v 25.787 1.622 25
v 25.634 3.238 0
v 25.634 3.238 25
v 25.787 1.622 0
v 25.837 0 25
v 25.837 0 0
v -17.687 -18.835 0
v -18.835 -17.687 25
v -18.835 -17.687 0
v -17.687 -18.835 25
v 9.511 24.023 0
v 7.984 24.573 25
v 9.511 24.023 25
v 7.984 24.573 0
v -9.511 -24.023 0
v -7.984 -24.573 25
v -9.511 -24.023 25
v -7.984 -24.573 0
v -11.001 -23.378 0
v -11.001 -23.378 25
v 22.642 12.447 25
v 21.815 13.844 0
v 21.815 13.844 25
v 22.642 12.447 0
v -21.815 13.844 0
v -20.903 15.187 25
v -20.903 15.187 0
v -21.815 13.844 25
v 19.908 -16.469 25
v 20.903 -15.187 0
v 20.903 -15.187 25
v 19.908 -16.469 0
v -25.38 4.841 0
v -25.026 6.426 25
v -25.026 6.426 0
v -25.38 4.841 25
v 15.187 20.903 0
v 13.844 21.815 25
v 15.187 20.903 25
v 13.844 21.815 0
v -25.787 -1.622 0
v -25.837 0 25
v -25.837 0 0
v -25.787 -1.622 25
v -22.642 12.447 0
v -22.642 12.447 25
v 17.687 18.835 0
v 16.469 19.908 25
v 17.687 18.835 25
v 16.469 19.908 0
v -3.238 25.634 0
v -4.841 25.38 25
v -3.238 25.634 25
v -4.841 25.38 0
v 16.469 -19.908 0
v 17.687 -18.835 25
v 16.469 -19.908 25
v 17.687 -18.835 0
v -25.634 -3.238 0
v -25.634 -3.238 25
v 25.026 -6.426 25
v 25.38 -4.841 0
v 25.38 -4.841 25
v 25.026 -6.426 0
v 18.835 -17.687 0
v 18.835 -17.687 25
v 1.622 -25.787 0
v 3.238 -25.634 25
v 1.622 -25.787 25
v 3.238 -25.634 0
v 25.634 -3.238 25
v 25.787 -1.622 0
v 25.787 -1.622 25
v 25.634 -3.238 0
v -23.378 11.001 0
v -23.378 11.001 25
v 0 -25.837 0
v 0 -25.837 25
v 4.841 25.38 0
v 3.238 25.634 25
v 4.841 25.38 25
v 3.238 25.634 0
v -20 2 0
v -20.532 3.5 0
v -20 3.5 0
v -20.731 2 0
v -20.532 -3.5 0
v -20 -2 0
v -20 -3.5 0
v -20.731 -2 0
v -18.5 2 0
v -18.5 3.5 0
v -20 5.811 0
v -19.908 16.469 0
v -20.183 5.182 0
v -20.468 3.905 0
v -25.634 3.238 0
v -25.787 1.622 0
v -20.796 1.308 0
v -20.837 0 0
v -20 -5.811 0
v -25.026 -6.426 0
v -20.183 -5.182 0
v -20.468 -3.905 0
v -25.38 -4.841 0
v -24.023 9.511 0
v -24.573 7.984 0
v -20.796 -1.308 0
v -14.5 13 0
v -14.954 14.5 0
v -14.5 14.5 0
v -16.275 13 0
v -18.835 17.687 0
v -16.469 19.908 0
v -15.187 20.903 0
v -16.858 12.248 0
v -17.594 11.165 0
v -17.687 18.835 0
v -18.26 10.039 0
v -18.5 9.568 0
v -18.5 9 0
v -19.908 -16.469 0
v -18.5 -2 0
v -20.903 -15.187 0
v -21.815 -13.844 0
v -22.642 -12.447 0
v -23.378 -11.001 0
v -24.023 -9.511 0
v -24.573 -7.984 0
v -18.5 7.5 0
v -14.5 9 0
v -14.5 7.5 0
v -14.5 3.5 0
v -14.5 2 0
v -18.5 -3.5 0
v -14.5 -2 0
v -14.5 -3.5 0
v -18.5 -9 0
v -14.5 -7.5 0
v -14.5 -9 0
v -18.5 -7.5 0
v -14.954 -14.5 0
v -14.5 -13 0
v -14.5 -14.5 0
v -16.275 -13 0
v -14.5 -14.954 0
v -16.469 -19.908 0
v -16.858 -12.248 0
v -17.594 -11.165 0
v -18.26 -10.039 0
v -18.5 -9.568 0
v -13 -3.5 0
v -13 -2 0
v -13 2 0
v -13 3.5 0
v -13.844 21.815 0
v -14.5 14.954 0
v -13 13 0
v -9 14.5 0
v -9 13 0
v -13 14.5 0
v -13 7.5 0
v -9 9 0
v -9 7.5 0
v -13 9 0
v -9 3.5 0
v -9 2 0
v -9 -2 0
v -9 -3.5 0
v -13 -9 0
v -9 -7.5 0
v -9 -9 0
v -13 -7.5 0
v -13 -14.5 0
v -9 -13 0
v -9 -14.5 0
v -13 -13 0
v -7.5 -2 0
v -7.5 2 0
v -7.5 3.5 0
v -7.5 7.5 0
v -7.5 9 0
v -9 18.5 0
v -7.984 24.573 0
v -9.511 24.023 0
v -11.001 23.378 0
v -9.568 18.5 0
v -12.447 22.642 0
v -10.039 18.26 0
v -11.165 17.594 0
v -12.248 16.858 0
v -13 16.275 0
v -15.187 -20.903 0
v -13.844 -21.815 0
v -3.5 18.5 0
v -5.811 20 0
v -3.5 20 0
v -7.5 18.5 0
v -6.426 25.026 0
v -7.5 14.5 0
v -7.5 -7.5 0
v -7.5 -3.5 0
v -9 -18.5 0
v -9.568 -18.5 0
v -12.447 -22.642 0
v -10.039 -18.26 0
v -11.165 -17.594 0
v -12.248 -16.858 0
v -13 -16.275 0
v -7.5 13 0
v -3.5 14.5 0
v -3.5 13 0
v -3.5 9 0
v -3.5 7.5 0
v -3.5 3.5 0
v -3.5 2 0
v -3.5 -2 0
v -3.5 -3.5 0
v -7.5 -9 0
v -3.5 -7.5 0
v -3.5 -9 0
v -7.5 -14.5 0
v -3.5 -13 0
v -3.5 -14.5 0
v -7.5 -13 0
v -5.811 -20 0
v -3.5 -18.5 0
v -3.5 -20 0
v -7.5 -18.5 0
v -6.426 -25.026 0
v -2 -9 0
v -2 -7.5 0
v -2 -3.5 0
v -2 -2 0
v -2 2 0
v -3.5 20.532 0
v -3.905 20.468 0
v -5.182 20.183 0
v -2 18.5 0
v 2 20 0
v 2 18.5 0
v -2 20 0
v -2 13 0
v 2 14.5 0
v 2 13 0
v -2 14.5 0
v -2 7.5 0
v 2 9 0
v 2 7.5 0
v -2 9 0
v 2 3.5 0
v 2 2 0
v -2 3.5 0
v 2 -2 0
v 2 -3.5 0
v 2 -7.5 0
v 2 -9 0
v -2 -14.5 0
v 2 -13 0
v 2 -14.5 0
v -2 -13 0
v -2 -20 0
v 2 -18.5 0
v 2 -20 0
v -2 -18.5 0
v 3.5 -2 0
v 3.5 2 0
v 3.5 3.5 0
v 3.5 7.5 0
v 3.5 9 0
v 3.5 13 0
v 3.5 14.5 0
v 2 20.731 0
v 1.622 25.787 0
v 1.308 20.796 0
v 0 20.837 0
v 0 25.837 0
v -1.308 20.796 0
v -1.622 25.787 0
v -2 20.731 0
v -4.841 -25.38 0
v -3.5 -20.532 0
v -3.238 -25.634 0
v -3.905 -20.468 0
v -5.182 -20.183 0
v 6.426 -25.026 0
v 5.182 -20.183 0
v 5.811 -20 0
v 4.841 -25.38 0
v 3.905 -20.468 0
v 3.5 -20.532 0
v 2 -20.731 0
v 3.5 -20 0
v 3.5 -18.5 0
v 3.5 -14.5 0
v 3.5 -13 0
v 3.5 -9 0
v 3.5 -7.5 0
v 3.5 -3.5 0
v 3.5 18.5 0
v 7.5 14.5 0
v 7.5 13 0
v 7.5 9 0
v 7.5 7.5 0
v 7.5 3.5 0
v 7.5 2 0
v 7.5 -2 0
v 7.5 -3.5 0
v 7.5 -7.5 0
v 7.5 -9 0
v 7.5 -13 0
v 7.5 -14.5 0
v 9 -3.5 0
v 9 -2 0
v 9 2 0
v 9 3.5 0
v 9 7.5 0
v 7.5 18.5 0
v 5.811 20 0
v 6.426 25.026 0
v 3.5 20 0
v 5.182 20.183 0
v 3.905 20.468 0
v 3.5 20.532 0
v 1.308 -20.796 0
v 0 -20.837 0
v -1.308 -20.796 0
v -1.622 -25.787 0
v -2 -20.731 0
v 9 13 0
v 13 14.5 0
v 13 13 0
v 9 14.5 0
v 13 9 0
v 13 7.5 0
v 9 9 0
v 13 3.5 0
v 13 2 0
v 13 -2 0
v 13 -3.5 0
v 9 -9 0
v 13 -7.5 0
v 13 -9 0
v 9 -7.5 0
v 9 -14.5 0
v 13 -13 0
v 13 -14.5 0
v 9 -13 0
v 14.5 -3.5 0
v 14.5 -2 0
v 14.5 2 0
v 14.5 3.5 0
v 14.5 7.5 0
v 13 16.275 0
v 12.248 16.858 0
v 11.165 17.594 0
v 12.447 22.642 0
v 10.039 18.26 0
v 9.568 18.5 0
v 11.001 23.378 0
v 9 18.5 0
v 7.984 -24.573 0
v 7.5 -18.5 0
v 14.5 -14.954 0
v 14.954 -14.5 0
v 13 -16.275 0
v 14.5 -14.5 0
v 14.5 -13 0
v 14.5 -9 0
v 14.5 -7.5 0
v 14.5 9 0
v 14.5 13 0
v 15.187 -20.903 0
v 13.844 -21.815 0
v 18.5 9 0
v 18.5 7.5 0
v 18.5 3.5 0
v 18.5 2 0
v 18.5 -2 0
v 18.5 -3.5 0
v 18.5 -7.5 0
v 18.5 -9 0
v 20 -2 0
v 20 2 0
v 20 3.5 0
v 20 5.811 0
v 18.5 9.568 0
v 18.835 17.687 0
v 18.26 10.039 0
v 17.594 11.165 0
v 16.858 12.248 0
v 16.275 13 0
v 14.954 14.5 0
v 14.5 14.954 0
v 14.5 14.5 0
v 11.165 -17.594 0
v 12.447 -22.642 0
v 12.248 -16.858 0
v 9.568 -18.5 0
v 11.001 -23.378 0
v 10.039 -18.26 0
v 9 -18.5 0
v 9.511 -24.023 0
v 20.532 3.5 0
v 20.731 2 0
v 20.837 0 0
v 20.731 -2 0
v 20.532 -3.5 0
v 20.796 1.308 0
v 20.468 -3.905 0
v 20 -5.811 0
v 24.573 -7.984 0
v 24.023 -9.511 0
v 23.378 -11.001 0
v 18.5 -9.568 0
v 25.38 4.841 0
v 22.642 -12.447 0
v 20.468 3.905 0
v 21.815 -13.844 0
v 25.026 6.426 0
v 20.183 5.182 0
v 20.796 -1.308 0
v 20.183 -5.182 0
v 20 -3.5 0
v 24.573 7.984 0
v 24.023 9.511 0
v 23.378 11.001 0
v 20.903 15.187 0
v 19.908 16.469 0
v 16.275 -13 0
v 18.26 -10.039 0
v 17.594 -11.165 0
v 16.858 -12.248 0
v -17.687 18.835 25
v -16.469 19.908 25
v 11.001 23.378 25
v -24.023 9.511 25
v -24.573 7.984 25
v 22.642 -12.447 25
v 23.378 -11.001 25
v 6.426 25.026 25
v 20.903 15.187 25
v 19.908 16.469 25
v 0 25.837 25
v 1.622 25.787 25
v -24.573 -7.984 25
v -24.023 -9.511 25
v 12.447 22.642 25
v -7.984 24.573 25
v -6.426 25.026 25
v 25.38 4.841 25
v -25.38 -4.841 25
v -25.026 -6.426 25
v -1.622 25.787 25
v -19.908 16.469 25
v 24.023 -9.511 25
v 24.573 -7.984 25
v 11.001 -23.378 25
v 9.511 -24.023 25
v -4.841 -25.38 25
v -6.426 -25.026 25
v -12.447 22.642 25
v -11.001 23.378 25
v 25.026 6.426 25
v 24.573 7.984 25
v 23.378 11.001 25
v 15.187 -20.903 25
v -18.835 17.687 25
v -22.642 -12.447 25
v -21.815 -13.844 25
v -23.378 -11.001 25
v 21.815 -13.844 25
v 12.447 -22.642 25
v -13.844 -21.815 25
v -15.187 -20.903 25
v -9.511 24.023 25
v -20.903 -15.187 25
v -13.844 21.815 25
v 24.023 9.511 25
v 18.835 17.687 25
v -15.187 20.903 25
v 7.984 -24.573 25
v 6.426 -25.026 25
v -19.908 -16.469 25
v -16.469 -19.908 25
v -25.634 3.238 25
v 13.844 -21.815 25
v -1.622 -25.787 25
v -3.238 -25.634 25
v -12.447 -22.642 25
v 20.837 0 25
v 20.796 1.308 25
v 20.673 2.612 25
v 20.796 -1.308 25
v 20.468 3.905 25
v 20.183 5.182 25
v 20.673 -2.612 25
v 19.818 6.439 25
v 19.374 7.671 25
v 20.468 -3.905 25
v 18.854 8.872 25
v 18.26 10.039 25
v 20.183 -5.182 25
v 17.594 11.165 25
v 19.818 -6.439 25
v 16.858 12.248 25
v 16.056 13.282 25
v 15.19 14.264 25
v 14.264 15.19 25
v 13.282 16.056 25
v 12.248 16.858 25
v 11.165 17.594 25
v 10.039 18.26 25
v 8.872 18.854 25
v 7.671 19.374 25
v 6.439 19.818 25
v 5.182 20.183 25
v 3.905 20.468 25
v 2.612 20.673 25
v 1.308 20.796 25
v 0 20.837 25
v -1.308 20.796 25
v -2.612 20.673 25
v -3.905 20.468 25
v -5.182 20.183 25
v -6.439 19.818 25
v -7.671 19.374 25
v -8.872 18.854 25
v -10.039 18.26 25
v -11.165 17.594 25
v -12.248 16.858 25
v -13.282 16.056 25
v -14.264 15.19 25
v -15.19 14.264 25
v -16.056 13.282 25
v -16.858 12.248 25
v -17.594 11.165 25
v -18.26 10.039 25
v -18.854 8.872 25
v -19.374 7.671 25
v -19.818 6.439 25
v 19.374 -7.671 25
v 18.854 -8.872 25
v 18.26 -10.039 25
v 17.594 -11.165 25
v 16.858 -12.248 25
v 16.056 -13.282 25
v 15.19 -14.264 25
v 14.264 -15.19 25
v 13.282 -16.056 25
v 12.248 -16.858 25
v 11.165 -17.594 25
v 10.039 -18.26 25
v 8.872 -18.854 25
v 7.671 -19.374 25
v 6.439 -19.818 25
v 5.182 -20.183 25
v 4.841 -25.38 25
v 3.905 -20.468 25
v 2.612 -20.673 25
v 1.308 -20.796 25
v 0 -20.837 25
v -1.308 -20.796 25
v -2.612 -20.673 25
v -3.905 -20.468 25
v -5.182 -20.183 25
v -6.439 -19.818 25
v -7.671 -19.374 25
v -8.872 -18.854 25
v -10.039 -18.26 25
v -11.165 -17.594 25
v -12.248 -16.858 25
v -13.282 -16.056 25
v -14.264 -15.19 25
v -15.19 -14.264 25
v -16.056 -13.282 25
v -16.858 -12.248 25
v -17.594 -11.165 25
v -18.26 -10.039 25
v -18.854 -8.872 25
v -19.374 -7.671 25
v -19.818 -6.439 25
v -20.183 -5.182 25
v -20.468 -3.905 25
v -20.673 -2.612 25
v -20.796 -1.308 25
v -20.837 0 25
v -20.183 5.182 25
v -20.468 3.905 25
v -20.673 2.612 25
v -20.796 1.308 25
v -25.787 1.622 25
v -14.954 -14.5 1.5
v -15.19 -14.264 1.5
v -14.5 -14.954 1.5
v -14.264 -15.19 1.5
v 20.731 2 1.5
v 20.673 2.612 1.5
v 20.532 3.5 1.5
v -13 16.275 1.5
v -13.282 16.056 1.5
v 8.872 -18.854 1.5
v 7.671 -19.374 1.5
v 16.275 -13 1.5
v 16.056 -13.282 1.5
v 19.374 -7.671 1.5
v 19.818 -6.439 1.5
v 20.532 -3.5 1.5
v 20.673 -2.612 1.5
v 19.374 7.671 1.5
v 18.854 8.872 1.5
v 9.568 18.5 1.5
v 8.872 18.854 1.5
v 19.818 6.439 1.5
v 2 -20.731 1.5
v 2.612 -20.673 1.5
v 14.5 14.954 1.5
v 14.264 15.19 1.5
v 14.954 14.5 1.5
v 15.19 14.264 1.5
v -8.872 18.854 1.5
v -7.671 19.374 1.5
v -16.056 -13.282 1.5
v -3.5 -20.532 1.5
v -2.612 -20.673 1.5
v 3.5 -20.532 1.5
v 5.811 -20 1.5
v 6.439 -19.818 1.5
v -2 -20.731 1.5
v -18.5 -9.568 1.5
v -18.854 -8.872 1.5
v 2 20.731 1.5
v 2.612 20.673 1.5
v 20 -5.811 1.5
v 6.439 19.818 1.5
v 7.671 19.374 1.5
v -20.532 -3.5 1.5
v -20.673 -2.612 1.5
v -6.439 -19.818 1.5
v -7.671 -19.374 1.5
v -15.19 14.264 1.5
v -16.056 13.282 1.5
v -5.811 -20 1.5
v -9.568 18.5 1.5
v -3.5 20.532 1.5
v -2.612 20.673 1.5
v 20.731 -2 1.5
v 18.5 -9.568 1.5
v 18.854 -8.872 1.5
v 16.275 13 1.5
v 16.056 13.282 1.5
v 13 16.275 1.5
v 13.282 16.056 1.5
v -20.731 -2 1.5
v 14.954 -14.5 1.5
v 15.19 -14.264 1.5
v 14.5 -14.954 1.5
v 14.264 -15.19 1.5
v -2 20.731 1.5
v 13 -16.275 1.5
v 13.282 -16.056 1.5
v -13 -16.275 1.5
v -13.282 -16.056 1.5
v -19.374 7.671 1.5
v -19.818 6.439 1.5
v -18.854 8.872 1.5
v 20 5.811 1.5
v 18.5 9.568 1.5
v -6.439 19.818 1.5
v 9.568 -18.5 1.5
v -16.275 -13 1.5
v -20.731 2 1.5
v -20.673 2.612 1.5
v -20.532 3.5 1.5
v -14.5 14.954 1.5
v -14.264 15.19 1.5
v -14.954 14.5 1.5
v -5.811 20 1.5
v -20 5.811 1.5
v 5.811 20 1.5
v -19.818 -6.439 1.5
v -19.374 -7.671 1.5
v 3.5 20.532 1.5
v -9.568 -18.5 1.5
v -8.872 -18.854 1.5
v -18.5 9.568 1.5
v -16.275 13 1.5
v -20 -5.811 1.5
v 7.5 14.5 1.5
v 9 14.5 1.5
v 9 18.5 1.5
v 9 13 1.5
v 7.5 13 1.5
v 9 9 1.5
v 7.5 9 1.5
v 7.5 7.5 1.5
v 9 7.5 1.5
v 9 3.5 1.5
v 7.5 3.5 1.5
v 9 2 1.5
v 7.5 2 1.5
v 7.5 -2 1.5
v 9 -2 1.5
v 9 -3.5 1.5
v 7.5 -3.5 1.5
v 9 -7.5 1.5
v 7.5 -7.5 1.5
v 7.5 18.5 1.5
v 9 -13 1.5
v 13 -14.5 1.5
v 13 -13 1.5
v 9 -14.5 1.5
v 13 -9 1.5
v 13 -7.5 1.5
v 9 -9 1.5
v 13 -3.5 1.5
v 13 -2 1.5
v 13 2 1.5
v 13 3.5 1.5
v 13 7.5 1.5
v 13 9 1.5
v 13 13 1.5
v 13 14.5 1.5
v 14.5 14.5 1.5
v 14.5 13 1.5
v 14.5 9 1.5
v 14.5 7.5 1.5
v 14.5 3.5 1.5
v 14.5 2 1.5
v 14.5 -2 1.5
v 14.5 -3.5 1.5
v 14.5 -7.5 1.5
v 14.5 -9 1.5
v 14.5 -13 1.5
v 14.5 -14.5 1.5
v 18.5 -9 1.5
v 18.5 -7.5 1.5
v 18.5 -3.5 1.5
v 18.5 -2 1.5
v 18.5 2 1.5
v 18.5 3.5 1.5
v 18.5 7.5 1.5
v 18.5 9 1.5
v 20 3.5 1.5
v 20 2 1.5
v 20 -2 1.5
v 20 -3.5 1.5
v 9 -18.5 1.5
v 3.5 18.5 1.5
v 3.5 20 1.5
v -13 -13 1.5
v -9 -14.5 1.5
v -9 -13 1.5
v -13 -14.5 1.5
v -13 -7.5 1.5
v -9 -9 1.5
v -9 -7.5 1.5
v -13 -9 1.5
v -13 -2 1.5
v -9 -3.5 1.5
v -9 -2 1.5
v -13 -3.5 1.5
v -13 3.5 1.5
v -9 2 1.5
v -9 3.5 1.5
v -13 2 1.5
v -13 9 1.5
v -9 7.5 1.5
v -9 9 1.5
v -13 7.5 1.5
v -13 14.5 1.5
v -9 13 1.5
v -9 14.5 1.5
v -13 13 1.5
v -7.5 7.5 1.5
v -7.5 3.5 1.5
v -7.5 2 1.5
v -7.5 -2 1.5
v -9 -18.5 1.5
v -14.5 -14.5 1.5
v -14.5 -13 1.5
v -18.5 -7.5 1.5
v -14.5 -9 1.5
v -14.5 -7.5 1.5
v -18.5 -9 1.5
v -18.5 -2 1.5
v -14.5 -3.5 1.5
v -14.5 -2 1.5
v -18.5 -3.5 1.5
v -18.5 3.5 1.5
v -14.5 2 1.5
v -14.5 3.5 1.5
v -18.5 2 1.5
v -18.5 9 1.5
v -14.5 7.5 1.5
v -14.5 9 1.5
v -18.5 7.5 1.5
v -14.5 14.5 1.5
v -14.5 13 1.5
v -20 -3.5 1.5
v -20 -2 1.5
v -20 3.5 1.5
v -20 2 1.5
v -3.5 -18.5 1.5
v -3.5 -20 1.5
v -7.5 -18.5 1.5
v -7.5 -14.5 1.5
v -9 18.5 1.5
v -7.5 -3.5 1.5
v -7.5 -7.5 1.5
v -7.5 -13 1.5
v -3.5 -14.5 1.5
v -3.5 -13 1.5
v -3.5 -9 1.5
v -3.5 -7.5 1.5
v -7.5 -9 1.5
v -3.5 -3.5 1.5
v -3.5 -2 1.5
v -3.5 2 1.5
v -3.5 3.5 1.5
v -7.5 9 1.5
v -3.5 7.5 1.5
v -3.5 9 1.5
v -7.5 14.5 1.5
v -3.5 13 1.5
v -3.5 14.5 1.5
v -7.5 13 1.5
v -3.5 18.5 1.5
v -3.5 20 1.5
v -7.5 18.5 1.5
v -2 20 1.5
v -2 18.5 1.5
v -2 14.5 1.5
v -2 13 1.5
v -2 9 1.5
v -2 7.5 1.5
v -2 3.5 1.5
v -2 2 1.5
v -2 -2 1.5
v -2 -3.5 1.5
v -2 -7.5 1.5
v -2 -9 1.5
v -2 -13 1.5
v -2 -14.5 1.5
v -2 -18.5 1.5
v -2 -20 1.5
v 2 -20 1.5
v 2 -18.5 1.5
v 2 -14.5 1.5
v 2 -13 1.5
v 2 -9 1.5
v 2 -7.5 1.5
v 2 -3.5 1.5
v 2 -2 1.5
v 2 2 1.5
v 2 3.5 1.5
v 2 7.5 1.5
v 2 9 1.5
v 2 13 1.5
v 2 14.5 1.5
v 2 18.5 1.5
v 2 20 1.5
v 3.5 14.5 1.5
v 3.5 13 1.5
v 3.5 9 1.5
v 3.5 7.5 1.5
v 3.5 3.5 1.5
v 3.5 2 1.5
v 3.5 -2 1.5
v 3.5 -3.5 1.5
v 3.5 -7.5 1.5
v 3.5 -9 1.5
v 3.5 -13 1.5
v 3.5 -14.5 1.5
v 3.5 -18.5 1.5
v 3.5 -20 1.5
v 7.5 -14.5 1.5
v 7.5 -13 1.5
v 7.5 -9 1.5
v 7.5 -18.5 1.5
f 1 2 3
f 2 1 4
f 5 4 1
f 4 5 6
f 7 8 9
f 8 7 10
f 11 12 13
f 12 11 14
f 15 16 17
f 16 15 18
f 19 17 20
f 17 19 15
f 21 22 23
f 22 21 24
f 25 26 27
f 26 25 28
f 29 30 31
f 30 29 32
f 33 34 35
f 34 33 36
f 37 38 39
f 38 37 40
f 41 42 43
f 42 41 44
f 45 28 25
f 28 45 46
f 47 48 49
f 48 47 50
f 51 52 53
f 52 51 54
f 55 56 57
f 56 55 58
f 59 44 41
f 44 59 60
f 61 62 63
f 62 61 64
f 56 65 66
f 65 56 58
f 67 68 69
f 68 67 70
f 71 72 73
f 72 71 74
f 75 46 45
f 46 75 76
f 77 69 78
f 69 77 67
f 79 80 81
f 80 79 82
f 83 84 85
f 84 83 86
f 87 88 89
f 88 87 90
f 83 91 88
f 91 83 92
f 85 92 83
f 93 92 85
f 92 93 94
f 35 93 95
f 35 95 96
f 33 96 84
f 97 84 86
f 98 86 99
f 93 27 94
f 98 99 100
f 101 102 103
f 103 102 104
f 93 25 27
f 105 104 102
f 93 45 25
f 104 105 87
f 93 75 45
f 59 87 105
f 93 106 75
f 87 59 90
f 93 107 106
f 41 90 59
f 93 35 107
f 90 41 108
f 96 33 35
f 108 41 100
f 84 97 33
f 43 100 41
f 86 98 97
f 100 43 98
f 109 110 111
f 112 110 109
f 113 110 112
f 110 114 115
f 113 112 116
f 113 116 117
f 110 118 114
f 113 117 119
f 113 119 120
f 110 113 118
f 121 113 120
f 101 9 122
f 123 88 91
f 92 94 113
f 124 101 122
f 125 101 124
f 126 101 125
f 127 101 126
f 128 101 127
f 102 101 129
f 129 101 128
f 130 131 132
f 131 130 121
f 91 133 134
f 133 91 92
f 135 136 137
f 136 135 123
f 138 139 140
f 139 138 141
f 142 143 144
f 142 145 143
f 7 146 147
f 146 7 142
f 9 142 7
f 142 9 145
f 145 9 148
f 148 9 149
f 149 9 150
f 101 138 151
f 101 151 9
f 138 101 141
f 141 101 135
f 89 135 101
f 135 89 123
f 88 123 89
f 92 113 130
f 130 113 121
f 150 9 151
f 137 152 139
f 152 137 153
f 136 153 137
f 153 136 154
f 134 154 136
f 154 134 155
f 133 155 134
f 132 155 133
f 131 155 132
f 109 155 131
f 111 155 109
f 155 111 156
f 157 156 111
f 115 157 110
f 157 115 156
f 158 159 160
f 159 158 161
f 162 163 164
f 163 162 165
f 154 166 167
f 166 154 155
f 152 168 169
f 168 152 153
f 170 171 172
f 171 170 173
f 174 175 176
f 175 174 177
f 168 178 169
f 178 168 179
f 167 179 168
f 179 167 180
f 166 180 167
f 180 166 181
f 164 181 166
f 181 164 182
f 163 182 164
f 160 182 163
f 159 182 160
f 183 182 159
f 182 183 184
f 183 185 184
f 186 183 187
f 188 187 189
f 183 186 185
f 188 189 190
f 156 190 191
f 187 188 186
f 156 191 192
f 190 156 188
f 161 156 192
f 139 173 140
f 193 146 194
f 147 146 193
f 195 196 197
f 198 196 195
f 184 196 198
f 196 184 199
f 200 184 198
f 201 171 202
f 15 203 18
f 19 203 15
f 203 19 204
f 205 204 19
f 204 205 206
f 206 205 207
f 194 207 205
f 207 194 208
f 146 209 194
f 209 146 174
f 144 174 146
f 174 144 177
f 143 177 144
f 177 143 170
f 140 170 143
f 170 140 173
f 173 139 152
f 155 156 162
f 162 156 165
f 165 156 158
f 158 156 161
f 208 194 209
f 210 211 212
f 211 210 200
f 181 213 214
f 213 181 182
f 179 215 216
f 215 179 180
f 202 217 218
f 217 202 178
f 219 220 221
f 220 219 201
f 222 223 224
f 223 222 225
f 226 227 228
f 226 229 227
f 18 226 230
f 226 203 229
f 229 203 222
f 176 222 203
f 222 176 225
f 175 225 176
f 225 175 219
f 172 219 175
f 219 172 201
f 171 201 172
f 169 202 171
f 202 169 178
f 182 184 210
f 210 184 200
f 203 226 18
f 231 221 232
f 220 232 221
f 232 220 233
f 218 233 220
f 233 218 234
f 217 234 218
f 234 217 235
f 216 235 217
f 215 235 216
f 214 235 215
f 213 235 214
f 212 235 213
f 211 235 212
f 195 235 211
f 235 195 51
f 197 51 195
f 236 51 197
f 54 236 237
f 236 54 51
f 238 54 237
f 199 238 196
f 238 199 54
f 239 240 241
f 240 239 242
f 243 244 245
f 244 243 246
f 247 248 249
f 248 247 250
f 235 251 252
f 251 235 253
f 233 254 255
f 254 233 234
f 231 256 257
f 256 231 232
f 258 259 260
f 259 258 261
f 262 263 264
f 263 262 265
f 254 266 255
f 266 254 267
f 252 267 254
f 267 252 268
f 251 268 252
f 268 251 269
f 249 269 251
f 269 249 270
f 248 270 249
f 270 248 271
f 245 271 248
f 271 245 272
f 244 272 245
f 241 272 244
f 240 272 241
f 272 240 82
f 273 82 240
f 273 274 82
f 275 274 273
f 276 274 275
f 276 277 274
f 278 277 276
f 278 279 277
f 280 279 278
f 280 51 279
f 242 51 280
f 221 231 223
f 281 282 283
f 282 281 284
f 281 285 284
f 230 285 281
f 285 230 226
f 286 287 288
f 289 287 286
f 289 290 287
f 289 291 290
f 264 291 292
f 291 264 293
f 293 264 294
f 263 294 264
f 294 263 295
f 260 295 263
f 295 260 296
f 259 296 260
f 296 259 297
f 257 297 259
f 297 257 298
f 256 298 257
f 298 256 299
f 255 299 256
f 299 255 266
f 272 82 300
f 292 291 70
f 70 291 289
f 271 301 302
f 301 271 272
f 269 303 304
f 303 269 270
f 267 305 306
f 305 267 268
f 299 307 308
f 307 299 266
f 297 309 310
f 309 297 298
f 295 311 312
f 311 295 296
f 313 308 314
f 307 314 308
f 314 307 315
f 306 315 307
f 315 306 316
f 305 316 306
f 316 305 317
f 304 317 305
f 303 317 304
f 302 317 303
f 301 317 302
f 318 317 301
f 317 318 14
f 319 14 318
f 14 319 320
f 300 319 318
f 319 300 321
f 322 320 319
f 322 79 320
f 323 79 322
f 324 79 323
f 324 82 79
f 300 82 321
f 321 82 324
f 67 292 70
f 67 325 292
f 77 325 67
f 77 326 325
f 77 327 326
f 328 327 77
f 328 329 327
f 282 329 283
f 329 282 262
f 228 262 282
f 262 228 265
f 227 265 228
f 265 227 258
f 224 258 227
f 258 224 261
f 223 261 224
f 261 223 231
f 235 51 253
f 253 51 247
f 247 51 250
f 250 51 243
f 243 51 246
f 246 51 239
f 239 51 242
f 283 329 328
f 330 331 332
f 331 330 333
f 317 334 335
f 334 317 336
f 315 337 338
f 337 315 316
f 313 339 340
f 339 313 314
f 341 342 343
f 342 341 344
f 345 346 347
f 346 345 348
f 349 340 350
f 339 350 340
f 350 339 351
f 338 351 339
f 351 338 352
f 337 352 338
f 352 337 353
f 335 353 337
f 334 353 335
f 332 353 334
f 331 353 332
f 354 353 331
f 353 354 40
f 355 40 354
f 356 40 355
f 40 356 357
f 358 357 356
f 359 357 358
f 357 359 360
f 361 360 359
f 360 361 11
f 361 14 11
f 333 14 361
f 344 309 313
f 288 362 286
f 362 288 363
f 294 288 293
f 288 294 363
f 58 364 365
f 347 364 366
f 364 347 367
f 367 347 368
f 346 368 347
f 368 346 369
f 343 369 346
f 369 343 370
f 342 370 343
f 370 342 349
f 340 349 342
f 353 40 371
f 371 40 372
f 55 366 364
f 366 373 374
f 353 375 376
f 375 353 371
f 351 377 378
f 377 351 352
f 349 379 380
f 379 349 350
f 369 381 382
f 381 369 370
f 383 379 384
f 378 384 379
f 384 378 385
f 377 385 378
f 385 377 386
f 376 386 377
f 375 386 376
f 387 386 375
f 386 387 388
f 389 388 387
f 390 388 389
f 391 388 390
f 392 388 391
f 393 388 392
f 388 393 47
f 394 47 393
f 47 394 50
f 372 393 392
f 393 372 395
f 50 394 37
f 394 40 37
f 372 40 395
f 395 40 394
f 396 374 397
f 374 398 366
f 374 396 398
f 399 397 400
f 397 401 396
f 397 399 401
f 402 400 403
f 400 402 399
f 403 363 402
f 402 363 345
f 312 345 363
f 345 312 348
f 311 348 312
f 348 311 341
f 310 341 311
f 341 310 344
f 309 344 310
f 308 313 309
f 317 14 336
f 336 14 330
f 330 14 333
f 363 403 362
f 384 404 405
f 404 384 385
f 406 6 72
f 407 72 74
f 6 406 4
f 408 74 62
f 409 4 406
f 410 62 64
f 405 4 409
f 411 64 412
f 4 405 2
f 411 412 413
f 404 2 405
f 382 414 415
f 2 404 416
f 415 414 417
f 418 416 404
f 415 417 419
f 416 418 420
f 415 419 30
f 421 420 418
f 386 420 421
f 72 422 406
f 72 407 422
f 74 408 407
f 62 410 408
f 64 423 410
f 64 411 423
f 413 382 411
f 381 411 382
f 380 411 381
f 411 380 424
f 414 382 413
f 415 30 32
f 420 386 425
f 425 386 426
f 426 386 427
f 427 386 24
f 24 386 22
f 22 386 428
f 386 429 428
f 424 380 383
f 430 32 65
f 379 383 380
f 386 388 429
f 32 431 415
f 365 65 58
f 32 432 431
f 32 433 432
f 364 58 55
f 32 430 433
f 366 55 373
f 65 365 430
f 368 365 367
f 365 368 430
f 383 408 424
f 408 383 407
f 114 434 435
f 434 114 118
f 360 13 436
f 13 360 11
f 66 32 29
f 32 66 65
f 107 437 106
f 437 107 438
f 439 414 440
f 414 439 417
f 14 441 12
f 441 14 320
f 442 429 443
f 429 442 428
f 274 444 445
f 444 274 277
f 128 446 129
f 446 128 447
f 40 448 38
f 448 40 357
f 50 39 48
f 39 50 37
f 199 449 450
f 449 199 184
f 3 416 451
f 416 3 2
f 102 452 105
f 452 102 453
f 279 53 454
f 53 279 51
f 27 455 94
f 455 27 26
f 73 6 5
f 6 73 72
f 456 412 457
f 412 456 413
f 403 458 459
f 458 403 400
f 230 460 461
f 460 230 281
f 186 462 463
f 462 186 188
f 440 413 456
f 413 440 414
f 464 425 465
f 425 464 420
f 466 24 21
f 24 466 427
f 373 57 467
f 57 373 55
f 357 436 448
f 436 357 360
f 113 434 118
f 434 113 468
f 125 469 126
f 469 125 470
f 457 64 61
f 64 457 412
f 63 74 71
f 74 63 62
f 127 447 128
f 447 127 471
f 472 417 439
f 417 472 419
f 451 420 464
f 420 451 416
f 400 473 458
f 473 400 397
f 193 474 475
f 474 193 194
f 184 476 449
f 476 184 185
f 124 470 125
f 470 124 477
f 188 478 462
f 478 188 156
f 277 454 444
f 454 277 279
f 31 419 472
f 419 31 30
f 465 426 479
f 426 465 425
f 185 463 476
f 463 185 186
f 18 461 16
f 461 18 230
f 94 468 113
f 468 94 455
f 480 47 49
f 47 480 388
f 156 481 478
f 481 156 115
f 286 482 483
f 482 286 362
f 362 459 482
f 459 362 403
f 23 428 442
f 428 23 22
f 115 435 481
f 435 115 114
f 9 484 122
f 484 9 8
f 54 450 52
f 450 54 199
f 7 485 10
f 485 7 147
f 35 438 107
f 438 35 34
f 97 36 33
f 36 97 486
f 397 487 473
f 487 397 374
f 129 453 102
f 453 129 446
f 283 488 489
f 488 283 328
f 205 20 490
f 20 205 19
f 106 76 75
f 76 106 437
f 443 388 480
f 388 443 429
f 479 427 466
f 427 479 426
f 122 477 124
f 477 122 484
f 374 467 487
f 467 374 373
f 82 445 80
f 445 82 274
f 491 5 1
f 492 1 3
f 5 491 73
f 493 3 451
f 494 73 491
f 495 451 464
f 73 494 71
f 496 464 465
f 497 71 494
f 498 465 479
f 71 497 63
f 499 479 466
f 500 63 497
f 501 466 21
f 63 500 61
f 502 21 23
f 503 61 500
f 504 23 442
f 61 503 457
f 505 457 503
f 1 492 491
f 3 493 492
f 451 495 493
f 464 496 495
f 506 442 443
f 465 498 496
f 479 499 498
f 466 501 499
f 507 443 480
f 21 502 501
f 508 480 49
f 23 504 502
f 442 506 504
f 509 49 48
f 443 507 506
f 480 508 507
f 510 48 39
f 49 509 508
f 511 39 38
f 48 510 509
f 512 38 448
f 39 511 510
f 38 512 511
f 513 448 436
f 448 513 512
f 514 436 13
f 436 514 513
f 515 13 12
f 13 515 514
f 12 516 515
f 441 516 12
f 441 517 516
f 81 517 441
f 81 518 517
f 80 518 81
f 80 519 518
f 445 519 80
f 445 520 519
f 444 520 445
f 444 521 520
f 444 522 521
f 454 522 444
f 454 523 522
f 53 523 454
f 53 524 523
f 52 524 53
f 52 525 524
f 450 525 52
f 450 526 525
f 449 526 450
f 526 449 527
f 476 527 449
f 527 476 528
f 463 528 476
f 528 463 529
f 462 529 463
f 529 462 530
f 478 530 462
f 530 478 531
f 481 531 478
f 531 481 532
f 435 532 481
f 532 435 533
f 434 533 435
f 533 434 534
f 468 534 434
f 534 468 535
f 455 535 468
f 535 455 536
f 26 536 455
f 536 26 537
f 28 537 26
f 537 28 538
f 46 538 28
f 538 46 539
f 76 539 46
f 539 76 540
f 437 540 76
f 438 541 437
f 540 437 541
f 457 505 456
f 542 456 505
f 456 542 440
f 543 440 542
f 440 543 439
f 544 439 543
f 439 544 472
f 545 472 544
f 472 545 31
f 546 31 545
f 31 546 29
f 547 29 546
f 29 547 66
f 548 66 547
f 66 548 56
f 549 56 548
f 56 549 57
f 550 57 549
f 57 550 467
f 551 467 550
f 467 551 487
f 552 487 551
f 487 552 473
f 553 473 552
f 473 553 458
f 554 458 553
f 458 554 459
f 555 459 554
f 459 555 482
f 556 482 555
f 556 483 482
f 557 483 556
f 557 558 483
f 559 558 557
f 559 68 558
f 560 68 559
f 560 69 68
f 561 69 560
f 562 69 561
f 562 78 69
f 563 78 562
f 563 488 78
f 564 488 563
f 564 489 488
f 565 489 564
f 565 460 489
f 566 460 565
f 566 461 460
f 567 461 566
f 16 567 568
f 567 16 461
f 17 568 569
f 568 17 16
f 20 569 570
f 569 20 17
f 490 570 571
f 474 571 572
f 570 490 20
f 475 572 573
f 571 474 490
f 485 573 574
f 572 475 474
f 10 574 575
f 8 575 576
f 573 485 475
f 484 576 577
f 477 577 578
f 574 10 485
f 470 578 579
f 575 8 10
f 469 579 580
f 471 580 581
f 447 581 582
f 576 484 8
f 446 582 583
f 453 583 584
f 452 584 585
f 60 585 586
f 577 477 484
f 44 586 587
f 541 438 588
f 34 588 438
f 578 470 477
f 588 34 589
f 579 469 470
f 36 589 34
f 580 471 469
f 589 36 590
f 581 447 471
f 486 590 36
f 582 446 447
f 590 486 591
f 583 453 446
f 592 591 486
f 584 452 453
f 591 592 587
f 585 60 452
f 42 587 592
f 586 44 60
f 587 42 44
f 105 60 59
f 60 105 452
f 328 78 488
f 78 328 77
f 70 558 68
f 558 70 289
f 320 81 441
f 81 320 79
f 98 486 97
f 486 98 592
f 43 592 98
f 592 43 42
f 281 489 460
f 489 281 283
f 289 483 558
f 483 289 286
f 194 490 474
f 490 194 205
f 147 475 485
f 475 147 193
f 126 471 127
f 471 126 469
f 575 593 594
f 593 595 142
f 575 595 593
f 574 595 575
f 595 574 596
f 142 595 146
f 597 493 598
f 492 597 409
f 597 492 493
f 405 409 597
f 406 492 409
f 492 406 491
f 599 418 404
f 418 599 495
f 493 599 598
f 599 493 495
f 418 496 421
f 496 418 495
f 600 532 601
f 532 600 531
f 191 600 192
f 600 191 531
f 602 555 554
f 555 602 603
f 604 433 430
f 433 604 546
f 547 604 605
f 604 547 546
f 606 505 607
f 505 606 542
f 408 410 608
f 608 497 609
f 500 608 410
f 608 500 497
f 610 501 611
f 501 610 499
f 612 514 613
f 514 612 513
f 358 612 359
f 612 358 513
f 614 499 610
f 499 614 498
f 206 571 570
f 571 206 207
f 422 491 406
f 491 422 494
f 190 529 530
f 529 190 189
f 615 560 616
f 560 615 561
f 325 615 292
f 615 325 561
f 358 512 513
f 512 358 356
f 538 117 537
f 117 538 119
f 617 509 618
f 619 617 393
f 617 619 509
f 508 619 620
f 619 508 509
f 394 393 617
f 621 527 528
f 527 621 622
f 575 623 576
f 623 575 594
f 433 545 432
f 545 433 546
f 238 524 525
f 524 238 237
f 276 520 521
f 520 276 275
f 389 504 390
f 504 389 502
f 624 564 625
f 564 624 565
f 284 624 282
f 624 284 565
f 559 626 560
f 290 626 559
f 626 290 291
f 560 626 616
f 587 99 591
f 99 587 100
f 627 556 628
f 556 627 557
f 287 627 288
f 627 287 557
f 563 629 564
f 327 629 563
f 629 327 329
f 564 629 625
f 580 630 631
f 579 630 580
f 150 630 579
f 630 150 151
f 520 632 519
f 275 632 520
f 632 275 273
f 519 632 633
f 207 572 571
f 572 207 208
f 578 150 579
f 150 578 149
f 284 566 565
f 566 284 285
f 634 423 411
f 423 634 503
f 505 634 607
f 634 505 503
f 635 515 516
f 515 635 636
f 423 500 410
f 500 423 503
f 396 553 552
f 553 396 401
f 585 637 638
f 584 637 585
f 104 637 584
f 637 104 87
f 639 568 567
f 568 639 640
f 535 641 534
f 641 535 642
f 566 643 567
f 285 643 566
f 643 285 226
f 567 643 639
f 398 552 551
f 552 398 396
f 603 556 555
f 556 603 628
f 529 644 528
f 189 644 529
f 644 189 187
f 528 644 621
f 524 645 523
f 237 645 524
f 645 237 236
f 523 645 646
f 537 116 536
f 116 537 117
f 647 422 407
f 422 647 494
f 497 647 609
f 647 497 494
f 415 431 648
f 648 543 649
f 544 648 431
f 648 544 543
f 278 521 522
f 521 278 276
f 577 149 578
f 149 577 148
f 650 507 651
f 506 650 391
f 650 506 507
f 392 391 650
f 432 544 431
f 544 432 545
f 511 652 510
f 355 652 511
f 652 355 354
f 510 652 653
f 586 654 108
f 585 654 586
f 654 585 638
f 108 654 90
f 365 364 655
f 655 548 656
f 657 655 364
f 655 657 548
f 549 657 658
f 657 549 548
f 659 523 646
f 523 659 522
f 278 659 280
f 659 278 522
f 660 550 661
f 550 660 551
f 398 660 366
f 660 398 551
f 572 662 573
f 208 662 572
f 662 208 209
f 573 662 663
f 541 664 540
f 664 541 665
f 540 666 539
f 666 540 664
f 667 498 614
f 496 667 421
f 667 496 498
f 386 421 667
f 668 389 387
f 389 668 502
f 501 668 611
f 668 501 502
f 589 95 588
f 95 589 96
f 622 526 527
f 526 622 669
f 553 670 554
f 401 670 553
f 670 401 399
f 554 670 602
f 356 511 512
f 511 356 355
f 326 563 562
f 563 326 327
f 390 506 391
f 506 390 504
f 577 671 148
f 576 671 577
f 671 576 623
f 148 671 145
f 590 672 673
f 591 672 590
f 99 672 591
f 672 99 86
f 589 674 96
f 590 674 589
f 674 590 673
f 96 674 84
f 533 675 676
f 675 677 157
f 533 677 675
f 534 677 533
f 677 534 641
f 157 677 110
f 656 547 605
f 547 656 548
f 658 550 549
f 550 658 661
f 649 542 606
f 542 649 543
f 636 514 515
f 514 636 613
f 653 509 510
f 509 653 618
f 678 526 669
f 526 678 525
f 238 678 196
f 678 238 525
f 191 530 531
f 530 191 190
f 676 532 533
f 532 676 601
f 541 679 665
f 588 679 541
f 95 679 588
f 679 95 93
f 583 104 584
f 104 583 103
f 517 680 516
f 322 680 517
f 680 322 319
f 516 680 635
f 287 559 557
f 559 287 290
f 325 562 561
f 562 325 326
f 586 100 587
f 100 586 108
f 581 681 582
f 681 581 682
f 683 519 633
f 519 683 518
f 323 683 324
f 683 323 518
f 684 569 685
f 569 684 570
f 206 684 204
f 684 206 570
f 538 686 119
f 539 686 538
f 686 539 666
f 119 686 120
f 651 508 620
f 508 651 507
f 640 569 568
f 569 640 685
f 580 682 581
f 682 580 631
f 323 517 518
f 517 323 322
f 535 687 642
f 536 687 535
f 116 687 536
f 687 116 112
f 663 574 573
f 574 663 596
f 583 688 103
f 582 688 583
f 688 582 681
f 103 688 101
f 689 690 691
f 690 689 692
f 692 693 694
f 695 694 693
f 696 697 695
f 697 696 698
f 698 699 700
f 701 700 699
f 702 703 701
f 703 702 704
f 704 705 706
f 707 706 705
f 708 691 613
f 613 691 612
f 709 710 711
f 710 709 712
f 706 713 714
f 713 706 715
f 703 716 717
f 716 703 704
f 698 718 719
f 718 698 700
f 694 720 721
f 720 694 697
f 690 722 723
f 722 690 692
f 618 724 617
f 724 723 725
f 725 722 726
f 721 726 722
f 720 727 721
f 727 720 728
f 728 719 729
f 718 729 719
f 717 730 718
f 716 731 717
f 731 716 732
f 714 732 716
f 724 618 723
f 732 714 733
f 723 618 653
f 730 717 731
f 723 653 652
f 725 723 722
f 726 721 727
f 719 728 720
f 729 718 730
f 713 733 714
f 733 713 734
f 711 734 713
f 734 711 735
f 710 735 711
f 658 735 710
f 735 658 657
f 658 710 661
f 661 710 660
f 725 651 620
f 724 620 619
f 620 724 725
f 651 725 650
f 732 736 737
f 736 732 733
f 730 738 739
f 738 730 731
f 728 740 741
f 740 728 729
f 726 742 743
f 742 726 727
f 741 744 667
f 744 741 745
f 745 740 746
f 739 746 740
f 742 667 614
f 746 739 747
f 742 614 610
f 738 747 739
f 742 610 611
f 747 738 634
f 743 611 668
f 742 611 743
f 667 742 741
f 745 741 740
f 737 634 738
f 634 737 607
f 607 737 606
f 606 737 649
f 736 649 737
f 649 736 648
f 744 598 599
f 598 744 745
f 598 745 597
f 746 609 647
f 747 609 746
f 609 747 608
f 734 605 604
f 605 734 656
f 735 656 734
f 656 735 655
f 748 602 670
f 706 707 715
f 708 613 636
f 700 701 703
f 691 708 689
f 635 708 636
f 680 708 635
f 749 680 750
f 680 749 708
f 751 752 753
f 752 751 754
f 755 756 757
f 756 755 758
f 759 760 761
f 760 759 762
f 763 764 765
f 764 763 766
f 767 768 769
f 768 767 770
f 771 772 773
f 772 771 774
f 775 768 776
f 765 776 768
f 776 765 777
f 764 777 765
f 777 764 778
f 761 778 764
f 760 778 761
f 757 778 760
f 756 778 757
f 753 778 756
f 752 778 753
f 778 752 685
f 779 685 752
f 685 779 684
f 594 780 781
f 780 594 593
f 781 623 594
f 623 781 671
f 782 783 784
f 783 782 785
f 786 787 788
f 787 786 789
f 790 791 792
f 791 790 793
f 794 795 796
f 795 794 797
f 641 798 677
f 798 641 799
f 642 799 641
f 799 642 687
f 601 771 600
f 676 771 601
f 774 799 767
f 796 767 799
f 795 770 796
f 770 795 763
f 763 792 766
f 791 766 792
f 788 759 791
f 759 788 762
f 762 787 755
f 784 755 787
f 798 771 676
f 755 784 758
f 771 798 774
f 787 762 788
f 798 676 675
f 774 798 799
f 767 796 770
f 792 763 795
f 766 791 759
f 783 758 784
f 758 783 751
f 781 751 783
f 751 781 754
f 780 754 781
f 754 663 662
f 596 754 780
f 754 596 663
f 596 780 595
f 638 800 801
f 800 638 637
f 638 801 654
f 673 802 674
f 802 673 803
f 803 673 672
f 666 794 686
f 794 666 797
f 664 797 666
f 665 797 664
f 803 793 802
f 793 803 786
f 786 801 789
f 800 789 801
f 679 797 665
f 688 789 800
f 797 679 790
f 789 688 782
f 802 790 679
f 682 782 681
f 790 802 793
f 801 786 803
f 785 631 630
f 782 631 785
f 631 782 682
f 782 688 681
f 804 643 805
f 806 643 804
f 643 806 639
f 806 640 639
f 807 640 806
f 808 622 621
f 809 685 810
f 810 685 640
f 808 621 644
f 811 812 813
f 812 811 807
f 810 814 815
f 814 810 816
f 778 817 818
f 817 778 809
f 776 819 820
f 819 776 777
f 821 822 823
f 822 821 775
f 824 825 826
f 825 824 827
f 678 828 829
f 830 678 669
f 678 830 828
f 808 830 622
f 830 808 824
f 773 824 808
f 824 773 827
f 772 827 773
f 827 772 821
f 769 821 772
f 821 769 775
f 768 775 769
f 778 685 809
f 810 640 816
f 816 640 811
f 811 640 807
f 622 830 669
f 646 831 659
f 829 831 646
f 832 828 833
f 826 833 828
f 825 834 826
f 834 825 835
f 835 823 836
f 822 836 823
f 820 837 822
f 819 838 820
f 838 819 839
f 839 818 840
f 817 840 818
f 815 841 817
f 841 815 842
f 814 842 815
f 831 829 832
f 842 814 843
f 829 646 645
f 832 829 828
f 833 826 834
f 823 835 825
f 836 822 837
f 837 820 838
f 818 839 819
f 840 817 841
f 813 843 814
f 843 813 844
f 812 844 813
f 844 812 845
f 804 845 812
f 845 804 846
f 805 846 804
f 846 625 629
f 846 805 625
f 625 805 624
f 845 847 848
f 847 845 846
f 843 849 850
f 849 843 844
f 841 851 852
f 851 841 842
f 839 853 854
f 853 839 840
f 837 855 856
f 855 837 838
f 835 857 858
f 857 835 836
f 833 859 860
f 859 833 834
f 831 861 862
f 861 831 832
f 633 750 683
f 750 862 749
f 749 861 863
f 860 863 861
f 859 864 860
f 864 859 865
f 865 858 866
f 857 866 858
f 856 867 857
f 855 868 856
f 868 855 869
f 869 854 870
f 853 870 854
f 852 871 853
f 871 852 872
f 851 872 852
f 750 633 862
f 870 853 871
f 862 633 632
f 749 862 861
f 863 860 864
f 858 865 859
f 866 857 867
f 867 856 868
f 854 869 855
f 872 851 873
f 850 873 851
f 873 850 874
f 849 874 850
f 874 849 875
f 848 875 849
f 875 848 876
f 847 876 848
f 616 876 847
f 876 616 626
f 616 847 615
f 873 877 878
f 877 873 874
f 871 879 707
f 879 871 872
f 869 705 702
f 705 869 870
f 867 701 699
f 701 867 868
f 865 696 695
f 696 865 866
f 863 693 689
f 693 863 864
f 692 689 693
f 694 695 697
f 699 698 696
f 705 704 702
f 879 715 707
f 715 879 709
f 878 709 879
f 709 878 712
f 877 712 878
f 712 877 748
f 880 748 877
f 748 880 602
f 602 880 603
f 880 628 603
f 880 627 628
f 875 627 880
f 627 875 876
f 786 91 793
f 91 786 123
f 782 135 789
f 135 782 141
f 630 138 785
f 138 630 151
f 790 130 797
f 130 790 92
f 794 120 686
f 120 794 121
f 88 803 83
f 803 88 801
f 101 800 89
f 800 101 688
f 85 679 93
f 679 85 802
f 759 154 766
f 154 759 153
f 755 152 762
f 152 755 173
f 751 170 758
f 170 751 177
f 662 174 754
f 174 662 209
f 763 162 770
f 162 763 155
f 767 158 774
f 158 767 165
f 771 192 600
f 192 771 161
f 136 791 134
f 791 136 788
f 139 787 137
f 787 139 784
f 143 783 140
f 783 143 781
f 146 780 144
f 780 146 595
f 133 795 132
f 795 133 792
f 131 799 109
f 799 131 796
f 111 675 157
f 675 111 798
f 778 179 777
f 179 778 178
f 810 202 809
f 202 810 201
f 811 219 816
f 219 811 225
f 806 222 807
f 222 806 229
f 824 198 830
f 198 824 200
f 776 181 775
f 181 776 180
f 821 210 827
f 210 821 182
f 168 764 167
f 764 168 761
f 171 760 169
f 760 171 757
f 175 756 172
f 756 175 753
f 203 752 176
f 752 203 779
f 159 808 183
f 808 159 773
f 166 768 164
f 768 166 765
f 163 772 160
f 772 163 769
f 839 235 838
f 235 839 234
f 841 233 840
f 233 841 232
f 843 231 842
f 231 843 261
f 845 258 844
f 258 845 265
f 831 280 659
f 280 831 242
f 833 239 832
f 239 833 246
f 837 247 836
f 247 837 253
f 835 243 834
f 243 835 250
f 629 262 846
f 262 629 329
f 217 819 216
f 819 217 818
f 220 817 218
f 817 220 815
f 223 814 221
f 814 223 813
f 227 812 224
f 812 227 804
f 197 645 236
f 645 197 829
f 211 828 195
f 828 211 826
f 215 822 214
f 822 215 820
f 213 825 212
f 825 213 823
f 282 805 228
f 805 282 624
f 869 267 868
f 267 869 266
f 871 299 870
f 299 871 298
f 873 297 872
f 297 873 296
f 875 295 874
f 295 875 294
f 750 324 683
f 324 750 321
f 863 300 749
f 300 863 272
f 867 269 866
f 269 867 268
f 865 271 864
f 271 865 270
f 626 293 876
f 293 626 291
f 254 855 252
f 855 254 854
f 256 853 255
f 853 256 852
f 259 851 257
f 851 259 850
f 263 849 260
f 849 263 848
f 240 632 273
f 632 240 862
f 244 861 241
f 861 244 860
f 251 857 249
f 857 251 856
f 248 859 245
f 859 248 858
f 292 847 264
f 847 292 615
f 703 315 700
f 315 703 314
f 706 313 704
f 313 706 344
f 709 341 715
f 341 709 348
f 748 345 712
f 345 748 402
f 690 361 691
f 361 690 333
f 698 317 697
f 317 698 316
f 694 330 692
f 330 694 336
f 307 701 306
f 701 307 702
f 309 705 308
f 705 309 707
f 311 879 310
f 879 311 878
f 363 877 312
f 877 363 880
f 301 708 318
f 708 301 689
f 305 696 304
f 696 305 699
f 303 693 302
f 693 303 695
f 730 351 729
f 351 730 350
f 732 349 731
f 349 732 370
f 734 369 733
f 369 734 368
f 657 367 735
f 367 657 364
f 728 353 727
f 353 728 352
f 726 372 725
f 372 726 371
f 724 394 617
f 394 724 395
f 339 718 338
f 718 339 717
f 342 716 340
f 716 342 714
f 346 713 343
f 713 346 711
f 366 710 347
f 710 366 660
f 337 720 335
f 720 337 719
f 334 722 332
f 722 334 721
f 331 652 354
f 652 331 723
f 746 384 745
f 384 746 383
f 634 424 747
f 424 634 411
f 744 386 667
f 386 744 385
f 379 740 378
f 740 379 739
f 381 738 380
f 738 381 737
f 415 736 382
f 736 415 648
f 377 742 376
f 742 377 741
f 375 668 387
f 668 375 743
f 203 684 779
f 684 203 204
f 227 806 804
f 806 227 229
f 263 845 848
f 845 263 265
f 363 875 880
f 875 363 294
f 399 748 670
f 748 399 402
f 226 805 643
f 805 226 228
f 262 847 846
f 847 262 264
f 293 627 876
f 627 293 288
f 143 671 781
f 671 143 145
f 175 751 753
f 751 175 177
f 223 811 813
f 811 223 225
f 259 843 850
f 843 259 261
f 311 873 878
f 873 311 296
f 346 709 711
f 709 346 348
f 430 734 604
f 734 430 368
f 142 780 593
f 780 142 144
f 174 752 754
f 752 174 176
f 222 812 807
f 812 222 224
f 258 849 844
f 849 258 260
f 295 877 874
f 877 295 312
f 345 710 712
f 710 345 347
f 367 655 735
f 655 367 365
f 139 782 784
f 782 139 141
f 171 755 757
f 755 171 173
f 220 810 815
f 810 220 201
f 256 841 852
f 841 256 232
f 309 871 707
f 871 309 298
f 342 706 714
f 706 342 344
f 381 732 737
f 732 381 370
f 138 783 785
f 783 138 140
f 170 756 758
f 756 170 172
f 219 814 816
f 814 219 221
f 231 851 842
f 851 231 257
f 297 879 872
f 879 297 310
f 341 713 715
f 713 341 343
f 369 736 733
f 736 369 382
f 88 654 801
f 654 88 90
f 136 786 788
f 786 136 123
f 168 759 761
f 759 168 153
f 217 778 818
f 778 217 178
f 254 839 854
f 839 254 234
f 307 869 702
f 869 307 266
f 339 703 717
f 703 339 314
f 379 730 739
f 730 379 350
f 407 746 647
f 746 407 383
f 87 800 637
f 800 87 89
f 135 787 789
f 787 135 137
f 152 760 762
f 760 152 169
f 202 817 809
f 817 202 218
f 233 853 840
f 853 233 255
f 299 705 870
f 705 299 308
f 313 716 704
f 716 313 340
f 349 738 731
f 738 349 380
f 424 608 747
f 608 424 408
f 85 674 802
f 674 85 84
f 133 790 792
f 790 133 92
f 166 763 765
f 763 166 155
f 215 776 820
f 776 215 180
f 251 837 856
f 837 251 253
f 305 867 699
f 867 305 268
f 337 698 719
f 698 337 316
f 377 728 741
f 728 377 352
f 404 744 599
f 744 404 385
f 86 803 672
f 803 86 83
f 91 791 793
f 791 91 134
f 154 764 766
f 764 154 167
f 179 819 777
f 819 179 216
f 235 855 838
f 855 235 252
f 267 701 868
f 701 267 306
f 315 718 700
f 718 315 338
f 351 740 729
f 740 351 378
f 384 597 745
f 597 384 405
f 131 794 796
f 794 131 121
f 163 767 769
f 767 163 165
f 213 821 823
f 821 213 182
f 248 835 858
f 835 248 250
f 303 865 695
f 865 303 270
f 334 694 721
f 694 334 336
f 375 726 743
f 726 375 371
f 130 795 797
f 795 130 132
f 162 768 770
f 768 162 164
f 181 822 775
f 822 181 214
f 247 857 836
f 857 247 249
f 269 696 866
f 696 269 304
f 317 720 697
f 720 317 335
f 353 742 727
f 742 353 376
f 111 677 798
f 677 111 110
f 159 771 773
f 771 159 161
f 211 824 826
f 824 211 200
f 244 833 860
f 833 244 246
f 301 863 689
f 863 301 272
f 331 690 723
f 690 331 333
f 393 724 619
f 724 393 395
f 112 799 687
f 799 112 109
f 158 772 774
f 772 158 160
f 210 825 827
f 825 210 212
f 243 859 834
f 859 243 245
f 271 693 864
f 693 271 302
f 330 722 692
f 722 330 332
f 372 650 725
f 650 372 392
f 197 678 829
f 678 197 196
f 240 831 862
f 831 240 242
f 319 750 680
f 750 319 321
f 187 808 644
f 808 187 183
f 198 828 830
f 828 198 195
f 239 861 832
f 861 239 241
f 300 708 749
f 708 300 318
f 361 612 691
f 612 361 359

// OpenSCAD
python_od = 41.675; 
grid_spacing = 5.5; 
grid_w = 1.5;
python_ht = 25; 
grid_ht = 1.5; 
outer_wall_w = 5;
eps = 0.01; 

$fn=100; 

module mesh(x, y, spacing, ht, th){ 
  total_x = x*spacing; 
  total_y = y*spacing; 
  for (xdir = [-total_x/2:spacing:total_x/2]) {
     translate([-th/2+xdir,-total_y/2,0]) 
        cube([th,total_y,ht]);  
  }
  for (ydir = [-total_y/2:spacing:total_y/2]) {
    translate([-total_x/2,-th/2+ydir,0]) 
        cube([total_x,th,ht]); 
  }
}

num_mesh = round(python_od/grid_spacing+1);
echo(num_mesh);

module cover() {
  difference() {
    cylinder(h=python_ht, d=python_od+2*outer_wall_w); 
    translate([0,0,-eps]) cylinder(h=python_ht+2*eps, d=python_od); 
  }
  intersection(){
    cylinder(h=python_ht, d=python_od+2*outer_wall_w);
    mesh(num_mesh, num_mesh,grid_spacing,grid_ht,grid_w);  
  }
}

cover(); 
